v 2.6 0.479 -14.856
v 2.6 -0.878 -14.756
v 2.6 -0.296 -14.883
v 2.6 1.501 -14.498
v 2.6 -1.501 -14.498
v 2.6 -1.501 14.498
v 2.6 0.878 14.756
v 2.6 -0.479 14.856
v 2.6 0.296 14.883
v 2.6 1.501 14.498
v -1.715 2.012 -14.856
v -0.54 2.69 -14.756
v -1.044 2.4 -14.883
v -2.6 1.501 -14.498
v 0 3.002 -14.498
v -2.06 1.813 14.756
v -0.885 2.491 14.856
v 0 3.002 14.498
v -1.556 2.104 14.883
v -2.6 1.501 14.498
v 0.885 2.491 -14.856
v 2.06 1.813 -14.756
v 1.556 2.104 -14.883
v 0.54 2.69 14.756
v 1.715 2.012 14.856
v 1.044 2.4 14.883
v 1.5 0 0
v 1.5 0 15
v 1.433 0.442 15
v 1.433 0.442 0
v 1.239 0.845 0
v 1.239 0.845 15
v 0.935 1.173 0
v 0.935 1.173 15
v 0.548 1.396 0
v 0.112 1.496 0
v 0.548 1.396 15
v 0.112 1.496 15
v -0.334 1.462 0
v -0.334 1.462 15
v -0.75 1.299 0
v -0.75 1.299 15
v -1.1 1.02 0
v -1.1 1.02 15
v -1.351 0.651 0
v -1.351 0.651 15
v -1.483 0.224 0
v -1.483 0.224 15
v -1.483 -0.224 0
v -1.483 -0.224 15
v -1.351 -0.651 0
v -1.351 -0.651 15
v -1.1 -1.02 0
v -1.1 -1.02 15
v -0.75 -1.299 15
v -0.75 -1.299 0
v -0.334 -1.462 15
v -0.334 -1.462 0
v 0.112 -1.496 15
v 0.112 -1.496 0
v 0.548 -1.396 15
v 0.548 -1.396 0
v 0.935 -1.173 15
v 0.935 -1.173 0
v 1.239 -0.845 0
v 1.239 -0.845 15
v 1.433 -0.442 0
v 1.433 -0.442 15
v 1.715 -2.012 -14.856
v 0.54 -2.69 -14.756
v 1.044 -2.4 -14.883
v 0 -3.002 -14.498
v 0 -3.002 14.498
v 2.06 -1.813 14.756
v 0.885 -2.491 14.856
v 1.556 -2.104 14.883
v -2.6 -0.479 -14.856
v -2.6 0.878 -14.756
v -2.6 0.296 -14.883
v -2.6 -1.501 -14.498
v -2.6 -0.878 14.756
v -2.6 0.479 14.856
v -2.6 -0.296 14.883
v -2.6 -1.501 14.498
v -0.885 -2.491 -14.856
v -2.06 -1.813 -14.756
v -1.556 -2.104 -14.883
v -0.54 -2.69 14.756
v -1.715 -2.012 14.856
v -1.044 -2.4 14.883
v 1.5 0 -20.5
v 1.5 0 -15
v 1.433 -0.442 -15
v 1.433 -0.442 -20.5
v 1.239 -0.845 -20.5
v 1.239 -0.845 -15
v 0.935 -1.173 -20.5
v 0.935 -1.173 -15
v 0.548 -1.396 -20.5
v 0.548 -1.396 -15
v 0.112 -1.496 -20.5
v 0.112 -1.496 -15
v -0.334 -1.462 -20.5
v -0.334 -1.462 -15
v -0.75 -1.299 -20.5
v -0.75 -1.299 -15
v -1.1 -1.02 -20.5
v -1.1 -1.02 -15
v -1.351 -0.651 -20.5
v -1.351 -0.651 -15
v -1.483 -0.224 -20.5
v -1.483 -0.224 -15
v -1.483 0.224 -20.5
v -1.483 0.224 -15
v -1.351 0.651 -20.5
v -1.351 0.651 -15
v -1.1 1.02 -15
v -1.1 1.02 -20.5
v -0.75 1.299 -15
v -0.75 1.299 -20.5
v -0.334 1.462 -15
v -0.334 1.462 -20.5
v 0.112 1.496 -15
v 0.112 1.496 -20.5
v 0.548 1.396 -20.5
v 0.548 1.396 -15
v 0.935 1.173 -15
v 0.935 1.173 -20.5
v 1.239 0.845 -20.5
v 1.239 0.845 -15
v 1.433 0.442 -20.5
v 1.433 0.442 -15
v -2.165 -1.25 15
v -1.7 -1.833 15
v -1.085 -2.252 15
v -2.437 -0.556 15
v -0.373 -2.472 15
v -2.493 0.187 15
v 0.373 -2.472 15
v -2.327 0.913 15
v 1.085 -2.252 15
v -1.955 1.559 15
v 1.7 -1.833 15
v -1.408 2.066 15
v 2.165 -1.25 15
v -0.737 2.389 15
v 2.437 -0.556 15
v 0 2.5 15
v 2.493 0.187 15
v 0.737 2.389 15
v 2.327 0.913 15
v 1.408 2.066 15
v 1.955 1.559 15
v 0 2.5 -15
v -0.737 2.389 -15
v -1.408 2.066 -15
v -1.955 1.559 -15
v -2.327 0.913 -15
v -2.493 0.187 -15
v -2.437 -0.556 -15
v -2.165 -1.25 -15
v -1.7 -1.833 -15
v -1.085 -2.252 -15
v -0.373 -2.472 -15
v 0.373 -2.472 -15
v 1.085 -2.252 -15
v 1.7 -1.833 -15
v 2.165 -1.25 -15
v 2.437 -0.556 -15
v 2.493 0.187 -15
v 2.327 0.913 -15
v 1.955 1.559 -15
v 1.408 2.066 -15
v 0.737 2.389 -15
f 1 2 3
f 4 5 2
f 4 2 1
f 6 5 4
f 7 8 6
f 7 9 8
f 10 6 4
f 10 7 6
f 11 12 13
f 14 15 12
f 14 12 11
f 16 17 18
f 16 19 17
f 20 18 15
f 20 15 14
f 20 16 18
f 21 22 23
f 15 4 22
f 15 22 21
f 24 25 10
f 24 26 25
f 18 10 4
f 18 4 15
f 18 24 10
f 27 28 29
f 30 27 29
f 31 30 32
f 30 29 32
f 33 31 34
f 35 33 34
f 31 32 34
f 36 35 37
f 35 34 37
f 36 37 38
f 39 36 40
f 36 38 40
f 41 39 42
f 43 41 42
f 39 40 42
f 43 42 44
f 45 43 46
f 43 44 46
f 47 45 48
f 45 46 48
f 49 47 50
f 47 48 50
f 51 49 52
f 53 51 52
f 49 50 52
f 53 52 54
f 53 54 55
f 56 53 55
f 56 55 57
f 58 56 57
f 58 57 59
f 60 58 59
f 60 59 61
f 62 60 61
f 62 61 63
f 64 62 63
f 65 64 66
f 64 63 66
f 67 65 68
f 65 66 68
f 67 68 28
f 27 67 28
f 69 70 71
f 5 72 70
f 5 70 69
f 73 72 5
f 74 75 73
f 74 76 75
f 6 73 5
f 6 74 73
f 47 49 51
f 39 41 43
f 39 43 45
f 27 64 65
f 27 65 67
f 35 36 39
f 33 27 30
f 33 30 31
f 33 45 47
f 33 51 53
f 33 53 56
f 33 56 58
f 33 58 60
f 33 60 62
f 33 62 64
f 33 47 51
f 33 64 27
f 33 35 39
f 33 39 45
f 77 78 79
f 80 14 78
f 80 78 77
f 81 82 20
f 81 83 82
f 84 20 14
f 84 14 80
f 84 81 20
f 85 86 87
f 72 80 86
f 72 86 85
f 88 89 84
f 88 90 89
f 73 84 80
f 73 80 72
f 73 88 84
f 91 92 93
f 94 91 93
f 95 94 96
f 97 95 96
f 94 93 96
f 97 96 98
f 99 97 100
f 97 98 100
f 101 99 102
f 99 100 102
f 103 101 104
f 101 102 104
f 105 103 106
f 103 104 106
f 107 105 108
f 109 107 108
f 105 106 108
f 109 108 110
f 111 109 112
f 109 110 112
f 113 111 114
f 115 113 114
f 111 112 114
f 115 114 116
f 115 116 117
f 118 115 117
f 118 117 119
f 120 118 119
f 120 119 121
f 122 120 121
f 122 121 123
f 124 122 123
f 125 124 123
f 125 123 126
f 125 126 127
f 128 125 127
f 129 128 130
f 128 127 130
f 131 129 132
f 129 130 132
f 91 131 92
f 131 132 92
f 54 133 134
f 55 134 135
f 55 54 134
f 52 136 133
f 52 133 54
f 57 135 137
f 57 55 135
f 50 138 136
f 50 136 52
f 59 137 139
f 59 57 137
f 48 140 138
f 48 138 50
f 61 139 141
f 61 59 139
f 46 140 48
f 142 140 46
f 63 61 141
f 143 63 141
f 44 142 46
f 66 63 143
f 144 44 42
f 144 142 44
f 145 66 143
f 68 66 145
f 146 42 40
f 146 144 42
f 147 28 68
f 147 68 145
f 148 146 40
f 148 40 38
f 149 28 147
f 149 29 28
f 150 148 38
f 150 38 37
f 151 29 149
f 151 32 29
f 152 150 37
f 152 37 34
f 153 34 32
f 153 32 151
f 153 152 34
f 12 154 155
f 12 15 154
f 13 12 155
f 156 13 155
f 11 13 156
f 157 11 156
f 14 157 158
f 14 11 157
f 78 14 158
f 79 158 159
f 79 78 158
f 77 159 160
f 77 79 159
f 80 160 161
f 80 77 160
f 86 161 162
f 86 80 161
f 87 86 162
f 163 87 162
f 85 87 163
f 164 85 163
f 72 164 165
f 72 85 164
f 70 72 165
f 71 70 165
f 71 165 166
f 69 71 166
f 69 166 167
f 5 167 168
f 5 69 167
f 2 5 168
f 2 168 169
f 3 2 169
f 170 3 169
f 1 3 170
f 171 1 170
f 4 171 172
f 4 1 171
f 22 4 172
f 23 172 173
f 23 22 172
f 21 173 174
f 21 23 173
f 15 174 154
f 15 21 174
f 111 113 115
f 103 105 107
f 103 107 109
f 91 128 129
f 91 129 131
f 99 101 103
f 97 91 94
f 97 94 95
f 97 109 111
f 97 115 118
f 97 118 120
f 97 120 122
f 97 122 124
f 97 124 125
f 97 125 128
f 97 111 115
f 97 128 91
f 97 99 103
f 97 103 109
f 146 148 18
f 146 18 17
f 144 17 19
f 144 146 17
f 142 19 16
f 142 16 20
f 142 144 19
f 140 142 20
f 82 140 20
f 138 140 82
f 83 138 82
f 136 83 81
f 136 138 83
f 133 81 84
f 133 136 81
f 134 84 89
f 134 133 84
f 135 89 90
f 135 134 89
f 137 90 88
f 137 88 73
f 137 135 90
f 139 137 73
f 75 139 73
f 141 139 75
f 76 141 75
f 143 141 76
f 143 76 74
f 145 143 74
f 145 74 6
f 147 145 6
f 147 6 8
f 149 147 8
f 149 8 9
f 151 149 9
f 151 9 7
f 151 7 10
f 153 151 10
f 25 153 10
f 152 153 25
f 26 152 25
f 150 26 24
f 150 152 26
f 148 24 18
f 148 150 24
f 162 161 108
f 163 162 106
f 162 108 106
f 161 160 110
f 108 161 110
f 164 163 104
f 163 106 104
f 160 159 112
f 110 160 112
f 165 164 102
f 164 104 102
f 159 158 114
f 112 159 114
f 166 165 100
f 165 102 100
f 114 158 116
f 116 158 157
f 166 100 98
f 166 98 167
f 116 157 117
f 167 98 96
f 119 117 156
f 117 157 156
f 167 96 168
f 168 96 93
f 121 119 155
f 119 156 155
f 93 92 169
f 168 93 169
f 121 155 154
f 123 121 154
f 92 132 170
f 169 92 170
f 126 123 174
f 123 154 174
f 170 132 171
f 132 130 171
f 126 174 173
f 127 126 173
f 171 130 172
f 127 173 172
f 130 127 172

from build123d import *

# Parameters (mm, degrees)
PAD_DEPTH    = 15
SKETCH001_R  = 1.5
POCKET_DEPTH = 15
SKETCH002_R  = 1.5
PAD001_DEPTH = 5.5


with BuildPart() as body001:
    # Sketch003 → Revolution (revolve)
    with BuildSketch(Plane.YZ):
        Polygon((2, 15.5), (5, 15.5), (5, -15.5), (2, -15.5), (3.923501, -13.576499), (3.923501, 13.576499), align=None)
    revolve(axis=Axis((0, 0, 0), (0, 0, 1)))


with BuildPart() as cut:
    # Sketch → Pad (new body, symmetric)
    with BuildSketch(Plane.XY):
        Polygon((2.6, 1.501111), (0, 3.002221), (-2.6, 1.501111), (-2.6, -1.501111), (0, -3.002221), (2.6, -1.501111), align=None)
    extrude(amount=PAD_DEPTH, both=True)

    # Sketch001 (on Face8 of Pad) → Pocket (cut)
    with BuildSketch(Plane.XY.offset(15)):
        Circle(SKETCH001_R)
    extrude(amount=-POCKET_DEPTH, mode=Mode.SUBTRACT)

    # Sketch002 (on Face4 of Pocket) → Pad001 (join)
    with BuildSketch(Plane(origin=(0, 0, -15), x_dir=(1, 0, 0), z_dir=(0, 0, -1))):
        Circle(SKETCH002_R)
    extrude(amount=PAD001_DEPTH)

    # Cut: cut Body001
    add(body001.part, mode=Mode.SUBTRACT)


solid = cut.part
